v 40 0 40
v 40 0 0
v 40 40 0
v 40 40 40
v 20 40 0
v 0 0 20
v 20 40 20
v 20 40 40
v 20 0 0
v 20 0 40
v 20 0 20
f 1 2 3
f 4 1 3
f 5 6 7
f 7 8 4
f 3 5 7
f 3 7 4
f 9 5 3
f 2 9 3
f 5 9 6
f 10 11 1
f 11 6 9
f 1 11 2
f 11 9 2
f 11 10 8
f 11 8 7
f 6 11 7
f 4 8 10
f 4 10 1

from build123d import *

# Parameters (mm, degrees)
SKETCH1_W           = 40
SKETCH1_H           = 40
BOSS_EXTRUDE1_DEPTH = 40
CUT_EXTRUDE1_DEPTH  = 40
SKETCH3_W           = 20
SKETCH3_H           = 20
CUT_EXTRUDE2_DEPTH  = 40
CUT_EXTRUDE3_DEPTH  = 40


with BuildPart() as part:
    # Sketch1 → Boss-Extrude1 (new body)
    with BuildSketch(Plane.XY):
        with Locations((20, 20)):
            Rectangle(SKETCH1_W, SKETCH1_H)
    extrude(amount=BOSS_EXTRUDE1_DEPTH)

    # Sketch2 → Cut-Extrude1 (cut)
    with BuildSketch(Plane.XY.offset(40)):
        Polygon((0, 0), (20, 40), (0, 40), align=None)
    extrude(amount=-CUT_EXTRUDE1_DEPTH, mode=Mode.SUBTRACT)

    # Sketch3 → Cut-Extrude2 (cut)
    with BuildSketch(Plane(origin=(0, 0, 0), x_dir=(-1, 0, 0), z_dir=(0, -1, 0))):
        with Locations((-10, -30)):
            Rectangle(SKETCH3_W, SKETCH3_H)
    extrude(amount=-CUT_EXTRUDE2_DEPTH, mode=Mode.SUBTRACT)

    # Sketch4 → Cut-Extrude3 (cut)
    with BuildSketch(Plane.XZ):
        Polygon((20, 0), (0, 20), (0, 0), align=None)
    extrude(amount=-CUT_EXTRUDE3_DEPTH, mode=Mode.SUBTRACT)


solid = part.part
